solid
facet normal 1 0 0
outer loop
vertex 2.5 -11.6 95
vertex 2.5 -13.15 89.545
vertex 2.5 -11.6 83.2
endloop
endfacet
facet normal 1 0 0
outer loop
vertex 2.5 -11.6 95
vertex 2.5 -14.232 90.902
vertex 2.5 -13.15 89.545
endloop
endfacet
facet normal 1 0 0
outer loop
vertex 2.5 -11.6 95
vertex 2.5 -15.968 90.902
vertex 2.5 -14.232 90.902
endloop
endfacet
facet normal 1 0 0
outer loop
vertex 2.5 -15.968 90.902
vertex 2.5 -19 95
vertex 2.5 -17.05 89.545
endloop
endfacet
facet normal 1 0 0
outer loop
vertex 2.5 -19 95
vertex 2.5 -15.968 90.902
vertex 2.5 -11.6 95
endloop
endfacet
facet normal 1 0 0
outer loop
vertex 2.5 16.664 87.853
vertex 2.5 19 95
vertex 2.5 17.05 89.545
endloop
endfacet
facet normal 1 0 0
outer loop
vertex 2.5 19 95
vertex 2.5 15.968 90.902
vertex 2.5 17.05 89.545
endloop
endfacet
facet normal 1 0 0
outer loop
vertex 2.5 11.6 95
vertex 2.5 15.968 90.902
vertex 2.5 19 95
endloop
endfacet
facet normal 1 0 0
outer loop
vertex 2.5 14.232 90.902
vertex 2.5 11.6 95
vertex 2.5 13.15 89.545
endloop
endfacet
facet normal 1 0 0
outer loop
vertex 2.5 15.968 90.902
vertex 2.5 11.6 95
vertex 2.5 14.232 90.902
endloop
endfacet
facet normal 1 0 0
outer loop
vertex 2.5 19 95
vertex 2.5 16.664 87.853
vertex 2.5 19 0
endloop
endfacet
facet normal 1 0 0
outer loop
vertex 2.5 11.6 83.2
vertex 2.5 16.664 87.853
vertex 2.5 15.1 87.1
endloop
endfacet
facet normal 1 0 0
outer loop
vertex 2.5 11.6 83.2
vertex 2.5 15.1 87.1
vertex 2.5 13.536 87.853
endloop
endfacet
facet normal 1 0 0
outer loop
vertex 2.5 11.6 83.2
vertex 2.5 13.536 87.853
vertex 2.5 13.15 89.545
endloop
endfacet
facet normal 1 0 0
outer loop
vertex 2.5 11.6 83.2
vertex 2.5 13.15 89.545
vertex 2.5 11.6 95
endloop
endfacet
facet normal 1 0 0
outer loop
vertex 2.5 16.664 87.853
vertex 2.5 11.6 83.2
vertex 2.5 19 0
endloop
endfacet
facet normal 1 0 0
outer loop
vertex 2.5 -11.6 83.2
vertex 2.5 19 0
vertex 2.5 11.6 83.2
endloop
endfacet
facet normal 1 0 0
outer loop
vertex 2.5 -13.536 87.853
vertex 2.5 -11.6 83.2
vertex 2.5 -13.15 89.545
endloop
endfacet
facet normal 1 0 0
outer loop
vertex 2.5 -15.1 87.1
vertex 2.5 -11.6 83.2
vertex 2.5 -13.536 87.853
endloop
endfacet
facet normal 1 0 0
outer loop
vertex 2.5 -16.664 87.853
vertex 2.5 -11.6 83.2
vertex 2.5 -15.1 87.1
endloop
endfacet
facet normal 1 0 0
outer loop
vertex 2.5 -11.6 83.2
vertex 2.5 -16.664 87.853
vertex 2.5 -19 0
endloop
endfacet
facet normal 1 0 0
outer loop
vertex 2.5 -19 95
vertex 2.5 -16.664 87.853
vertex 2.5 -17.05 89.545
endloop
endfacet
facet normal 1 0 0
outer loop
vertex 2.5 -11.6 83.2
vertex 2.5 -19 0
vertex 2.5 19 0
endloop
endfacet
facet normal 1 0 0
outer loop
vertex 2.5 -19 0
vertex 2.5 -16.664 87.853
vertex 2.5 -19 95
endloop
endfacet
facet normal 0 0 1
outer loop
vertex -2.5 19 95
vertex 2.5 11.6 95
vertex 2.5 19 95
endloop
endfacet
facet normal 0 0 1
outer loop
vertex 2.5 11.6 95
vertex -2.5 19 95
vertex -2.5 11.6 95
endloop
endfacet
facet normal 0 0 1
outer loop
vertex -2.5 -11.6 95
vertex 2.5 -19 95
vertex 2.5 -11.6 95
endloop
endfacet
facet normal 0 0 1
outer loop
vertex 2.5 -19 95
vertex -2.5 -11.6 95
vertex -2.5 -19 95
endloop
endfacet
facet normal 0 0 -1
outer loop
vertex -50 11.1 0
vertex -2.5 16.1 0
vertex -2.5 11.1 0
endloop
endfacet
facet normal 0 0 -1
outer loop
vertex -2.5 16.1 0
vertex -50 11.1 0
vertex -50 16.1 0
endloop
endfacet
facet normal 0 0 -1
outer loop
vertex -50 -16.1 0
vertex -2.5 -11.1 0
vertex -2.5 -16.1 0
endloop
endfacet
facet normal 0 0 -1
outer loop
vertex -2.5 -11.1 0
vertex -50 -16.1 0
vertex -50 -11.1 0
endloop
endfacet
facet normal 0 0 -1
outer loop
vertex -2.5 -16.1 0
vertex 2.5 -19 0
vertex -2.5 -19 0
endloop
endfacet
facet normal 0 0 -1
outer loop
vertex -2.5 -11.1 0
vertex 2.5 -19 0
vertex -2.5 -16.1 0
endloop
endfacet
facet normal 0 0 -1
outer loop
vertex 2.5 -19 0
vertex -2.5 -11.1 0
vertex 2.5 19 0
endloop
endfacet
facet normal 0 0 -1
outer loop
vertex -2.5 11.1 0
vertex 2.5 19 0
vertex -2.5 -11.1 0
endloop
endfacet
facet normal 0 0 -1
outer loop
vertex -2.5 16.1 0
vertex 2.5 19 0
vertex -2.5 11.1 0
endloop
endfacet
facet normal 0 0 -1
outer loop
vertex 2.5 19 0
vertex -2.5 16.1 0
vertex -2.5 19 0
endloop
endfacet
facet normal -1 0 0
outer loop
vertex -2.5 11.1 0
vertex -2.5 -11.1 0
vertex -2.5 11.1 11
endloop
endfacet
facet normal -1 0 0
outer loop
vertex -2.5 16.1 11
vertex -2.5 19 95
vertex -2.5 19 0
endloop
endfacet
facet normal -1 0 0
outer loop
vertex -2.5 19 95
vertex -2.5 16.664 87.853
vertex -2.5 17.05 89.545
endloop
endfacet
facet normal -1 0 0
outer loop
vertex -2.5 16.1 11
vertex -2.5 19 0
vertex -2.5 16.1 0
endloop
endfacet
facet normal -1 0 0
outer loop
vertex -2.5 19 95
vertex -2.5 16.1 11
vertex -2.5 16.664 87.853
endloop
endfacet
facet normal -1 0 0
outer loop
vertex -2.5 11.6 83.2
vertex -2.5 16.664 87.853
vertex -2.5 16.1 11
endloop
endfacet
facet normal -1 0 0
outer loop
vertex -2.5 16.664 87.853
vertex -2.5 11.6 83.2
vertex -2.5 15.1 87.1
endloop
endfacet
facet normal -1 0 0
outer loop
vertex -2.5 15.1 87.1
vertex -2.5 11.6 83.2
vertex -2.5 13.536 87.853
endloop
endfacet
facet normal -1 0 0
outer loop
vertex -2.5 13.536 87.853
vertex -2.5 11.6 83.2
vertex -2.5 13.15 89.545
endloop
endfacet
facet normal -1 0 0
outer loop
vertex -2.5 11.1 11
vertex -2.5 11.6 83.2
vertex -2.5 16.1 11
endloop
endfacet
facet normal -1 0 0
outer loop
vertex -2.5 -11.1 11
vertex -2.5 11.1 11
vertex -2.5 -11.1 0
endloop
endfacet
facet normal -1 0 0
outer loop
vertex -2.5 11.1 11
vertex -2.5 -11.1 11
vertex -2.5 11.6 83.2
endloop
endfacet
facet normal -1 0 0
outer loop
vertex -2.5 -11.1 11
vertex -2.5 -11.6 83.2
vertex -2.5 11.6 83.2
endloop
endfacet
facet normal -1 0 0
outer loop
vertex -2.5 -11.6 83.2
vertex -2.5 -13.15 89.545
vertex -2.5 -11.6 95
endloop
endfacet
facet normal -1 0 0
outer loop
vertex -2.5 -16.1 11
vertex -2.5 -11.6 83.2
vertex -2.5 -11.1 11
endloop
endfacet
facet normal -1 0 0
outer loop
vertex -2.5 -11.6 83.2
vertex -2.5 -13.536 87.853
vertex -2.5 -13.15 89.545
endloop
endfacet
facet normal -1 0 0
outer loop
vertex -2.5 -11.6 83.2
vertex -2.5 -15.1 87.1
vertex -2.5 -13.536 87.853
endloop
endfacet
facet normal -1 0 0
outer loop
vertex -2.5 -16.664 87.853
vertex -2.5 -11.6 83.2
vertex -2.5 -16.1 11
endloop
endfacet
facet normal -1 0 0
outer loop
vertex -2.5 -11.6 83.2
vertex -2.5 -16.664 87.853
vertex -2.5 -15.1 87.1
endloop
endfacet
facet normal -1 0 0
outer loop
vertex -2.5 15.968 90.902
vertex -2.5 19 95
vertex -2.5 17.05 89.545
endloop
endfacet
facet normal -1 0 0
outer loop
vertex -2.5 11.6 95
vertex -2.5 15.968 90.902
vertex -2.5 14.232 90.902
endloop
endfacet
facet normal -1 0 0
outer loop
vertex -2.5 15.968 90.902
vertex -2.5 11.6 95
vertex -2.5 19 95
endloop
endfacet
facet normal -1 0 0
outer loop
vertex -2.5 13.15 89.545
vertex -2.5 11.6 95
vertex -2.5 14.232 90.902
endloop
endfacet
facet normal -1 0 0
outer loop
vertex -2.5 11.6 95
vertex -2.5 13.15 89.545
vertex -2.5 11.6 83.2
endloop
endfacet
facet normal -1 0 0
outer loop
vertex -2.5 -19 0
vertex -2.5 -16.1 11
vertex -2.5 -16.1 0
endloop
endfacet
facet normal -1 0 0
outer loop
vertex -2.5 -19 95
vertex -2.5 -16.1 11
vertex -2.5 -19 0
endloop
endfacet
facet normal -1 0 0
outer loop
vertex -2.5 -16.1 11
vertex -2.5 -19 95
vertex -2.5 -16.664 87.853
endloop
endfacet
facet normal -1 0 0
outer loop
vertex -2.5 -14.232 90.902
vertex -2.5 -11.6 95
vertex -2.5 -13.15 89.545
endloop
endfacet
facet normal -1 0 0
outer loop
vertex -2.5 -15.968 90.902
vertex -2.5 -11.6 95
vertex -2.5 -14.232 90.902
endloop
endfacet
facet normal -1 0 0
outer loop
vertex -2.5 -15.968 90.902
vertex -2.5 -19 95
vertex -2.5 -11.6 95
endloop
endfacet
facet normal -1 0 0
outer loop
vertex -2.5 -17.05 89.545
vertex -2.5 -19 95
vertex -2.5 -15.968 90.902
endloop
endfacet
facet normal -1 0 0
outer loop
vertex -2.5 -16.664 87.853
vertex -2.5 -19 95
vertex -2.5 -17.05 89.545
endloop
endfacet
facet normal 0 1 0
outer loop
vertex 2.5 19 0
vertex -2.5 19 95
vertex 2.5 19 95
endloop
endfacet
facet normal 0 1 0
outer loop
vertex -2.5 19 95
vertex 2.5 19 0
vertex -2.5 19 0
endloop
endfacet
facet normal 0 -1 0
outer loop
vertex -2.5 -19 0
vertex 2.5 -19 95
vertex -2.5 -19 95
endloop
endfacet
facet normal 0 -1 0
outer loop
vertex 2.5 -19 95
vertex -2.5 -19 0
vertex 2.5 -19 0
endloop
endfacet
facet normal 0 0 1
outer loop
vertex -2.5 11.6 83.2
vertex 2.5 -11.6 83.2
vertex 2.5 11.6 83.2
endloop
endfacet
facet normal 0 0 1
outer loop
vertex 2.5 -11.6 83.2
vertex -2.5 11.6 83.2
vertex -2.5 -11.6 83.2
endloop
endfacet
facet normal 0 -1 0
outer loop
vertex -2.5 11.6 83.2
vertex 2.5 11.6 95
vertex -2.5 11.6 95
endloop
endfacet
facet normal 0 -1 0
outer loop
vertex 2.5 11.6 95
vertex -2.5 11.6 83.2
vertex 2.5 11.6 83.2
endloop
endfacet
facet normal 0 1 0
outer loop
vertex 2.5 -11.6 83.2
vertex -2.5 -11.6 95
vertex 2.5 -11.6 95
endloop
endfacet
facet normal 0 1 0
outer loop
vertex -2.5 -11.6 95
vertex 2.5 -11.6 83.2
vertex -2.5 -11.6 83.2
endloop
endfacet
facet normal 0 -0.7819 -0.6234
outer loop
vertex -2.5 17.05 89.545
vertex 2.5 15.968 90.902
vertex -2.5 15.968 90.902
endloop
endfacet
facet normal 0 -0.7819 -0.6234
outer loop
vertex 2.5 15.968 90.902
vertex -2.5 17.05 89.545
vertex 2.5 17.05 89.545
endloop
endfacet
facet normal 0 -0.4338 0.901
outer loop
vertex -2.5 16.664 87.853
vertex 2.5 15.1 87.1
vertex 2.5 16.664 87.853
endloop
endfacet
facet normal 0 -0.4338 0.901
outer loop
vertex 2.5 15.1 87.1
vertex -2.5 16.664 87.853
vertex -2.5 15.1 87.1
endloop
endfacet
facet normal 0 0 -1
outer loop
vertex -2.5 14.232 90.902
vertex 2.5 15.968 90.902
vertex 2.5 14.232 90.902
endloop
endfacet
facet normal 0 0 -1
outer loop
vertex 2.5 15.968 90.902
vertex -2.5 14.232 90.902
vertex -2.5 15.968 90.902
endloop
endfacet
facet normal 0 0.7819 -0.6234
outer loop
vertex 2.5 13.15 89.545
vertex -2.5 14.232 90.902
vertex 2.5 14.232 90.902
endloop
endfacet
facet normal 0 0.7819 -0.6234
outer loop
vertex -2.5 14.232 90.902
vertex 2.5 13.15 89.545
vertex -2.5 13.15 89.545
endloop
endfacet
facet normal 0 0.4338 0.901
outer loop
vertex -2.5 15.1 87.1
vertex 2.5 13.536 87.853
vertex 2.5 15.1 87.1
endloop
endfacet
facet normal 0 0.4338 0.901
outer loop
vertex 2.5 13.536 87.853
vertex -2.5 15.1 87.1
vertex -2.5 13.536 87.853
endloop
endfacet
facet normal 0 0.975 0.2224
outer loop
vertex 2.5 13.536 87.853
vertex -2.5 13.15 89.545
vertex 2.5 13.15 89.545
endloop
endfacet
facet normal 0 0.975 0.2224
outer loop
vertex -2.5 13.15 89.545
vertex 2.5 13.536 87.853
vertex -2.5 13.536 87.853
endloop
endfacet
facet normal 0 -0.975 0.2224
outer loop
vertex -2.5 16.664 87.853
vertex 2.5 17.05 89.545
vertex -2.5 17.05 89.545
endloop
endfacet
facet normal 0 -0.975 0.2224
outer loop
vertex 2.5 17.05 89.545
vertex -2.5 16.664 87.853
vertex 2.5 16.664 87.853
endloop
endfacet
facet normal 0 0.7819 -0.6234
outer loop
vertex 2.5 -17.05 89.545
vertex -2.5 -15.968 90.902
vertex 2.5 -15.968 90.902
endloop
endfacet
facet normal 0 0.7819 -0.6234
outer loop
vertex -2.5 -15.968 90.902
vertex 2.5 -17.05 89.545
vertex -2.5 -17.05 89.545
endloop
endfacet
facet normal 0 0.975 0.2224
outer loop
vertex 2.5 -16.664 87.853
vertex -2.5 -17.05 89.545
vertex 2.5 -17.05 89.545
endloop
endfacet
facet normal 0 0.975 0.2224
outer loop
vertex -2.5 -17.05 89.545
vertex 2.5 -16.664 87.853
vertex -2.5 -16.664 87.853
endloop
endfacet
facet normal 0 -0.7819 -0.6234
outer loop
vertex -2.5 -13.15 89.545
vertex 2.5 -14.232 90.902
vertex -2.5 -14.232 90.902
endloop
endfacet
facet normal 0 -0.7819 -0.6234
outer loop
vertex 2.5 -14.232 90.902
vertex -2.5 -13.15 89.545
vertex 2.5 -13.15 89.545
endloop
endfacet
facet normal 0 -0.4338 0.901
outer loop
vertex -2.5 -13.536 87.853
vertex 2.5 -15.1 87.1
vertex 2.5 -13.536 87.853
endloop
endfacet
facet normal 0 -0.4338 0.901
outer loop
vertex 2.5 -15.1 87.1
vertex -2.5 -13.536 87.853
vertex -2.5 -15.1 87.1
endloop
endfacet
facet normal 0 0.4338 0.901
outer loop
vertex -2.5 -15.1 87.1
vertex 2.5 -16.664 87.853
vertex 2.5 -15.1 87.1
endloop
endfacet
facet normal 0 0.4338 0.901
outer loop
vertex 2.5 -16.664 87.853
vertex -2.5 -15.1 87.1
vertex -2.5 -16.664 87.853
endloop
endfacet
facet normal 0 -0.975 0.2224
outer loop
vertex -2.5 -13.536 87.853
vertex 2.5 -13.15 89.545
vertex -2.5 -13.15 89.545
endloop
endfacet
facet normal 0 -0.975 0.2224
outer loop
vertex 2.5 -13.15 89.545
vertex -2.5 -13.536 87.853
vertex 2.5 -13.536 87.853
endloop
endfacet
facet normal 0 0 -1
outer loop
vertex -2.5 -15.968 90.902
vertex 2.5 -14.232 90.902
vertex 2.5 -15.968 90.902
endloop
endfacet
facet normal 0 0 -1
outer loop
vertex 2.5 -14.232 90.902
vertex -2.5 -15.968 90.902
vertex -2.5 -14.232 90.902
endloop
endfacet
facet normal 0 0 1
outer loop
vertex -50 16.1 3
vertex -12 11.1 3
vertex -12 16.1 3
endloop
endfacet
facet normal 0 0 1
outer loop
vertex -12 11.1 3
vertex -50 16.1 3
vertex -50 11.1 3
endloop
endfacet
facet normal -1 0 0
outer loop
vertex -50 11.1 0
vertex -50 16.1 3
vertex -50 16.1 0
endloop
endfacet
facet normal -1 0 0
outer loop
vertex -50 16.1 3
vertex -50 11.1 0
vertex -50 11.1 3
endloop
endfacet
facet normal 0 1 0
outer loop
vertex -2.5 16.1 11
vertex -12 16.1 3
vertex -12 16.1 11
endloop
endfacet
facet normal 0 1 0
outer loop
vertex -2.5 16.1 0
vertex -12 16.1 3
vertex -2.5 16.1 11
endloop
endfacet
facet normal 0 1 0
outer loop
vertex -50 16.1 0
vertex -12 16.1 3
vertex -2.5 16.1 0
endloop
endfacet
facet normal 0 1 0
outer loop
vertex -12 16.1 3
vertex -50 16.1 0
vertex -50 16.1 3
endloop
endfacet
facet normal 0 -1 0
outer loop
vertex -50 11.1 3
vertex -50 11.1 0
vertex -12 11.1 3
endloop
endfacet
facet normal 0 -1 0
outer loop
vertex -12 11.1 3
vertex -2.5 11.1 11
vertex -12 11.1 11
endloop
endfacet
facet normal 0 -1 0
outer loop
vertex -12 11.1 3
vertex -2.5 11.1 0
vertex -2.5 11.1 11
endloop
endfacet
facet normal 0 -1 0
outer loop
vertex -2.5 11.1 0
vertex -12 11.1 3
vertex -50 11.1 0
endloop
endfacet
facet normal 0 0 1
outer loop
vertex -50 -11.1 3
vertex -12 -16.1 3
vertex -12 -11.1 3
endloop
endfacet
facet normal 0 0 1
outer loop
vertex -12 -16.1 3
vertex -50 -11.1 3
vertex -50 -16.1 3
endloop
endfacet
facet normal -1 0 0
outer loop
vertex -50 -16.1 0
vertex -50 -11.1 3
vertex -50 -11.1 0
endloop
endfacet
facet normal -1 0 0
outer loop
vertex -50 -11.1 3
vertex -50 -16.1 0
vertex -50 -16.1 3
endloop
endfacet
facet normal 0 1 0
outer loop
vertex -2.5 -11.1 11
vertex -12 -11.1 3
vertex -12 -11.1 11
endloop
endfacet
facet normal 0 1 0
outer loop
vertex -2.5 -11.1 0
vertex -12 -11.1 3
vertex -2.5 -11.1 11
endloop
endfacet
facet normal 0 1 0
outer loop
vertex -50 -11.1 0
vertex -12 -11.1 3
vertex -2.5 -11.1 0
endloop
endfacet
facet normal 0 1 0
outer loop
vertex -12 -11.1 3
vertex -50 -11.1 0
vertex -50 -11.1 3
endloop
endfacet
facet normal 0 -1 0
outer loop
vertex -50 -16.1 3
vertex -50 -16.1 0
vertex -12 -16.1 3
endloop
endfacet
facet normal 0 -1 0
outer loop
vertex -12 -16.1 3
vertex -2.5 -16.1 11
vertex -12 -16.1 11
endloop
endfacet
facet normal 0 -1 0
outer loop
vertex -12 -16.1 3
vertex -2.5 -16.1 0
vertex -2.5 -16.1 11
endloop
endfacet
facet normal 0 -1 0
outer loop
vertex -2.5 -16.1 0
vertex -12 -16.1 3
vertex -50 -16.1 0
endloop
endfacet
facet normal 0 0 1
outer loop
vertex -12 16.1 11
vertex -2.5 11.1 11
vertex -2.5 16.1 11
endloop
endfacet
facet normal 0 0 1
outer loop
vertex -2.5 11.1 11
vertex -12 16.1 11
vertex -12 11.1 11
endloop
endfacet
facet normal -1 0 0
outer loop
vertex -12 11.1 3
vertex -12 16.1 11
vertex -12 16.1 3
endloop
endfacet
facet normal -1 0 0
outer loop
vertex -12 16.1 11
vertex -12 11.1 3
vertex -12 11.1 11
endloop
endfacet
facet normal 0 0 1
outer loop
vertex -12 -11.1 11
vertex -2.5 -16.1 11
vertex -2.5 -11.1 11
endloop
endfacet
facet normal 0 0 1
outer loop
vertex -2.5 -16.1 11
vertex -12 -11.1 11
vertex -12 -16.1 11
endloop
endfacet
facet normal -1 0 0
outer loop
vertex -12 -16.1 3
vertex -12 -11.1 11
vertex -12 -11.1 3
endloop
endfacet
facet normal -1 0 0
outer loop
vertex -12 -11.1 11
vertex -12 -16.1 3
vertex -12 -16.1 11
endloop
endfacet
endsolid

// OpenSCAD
union()
{
    translate([-25, -2.5 + 32.2/2, 1.5])
    cube([50, 5, 3], center = true);

    translate([-25, 2.5 -32.2/2, 1.5])
    cube([50, 5, 3], center = true);

    difference()
    {
        translate([0, 0, 95/2])
        cube([5, 38, 95], center = true);

        translate([0, 0, -11.8/2 + 95])
        cube([10, 23.2, 11.8], center = true);
        
        translate([0, 32.2/2 -1, + 95 - 11.8/2])
        rotate([0, 90, 0])
        cylinder(h = 10, d = 4, center = true);

        translate([0, -32.2/2 +1, + 95 - 11.8/2])
        rotate([0, 90, 0])
        cylinder(h = 10, d = 4, center = true);
    }

    translate([-10/2 -2, 32.2/2 - 2.5, 10/2 + 1])
    cube([10, 5, 10], center = true);

    translate([-10/2 -2, -32.2/2 + 2.5, 10/2 + 1])
    cube([10, 5, 10], center = true);
}
